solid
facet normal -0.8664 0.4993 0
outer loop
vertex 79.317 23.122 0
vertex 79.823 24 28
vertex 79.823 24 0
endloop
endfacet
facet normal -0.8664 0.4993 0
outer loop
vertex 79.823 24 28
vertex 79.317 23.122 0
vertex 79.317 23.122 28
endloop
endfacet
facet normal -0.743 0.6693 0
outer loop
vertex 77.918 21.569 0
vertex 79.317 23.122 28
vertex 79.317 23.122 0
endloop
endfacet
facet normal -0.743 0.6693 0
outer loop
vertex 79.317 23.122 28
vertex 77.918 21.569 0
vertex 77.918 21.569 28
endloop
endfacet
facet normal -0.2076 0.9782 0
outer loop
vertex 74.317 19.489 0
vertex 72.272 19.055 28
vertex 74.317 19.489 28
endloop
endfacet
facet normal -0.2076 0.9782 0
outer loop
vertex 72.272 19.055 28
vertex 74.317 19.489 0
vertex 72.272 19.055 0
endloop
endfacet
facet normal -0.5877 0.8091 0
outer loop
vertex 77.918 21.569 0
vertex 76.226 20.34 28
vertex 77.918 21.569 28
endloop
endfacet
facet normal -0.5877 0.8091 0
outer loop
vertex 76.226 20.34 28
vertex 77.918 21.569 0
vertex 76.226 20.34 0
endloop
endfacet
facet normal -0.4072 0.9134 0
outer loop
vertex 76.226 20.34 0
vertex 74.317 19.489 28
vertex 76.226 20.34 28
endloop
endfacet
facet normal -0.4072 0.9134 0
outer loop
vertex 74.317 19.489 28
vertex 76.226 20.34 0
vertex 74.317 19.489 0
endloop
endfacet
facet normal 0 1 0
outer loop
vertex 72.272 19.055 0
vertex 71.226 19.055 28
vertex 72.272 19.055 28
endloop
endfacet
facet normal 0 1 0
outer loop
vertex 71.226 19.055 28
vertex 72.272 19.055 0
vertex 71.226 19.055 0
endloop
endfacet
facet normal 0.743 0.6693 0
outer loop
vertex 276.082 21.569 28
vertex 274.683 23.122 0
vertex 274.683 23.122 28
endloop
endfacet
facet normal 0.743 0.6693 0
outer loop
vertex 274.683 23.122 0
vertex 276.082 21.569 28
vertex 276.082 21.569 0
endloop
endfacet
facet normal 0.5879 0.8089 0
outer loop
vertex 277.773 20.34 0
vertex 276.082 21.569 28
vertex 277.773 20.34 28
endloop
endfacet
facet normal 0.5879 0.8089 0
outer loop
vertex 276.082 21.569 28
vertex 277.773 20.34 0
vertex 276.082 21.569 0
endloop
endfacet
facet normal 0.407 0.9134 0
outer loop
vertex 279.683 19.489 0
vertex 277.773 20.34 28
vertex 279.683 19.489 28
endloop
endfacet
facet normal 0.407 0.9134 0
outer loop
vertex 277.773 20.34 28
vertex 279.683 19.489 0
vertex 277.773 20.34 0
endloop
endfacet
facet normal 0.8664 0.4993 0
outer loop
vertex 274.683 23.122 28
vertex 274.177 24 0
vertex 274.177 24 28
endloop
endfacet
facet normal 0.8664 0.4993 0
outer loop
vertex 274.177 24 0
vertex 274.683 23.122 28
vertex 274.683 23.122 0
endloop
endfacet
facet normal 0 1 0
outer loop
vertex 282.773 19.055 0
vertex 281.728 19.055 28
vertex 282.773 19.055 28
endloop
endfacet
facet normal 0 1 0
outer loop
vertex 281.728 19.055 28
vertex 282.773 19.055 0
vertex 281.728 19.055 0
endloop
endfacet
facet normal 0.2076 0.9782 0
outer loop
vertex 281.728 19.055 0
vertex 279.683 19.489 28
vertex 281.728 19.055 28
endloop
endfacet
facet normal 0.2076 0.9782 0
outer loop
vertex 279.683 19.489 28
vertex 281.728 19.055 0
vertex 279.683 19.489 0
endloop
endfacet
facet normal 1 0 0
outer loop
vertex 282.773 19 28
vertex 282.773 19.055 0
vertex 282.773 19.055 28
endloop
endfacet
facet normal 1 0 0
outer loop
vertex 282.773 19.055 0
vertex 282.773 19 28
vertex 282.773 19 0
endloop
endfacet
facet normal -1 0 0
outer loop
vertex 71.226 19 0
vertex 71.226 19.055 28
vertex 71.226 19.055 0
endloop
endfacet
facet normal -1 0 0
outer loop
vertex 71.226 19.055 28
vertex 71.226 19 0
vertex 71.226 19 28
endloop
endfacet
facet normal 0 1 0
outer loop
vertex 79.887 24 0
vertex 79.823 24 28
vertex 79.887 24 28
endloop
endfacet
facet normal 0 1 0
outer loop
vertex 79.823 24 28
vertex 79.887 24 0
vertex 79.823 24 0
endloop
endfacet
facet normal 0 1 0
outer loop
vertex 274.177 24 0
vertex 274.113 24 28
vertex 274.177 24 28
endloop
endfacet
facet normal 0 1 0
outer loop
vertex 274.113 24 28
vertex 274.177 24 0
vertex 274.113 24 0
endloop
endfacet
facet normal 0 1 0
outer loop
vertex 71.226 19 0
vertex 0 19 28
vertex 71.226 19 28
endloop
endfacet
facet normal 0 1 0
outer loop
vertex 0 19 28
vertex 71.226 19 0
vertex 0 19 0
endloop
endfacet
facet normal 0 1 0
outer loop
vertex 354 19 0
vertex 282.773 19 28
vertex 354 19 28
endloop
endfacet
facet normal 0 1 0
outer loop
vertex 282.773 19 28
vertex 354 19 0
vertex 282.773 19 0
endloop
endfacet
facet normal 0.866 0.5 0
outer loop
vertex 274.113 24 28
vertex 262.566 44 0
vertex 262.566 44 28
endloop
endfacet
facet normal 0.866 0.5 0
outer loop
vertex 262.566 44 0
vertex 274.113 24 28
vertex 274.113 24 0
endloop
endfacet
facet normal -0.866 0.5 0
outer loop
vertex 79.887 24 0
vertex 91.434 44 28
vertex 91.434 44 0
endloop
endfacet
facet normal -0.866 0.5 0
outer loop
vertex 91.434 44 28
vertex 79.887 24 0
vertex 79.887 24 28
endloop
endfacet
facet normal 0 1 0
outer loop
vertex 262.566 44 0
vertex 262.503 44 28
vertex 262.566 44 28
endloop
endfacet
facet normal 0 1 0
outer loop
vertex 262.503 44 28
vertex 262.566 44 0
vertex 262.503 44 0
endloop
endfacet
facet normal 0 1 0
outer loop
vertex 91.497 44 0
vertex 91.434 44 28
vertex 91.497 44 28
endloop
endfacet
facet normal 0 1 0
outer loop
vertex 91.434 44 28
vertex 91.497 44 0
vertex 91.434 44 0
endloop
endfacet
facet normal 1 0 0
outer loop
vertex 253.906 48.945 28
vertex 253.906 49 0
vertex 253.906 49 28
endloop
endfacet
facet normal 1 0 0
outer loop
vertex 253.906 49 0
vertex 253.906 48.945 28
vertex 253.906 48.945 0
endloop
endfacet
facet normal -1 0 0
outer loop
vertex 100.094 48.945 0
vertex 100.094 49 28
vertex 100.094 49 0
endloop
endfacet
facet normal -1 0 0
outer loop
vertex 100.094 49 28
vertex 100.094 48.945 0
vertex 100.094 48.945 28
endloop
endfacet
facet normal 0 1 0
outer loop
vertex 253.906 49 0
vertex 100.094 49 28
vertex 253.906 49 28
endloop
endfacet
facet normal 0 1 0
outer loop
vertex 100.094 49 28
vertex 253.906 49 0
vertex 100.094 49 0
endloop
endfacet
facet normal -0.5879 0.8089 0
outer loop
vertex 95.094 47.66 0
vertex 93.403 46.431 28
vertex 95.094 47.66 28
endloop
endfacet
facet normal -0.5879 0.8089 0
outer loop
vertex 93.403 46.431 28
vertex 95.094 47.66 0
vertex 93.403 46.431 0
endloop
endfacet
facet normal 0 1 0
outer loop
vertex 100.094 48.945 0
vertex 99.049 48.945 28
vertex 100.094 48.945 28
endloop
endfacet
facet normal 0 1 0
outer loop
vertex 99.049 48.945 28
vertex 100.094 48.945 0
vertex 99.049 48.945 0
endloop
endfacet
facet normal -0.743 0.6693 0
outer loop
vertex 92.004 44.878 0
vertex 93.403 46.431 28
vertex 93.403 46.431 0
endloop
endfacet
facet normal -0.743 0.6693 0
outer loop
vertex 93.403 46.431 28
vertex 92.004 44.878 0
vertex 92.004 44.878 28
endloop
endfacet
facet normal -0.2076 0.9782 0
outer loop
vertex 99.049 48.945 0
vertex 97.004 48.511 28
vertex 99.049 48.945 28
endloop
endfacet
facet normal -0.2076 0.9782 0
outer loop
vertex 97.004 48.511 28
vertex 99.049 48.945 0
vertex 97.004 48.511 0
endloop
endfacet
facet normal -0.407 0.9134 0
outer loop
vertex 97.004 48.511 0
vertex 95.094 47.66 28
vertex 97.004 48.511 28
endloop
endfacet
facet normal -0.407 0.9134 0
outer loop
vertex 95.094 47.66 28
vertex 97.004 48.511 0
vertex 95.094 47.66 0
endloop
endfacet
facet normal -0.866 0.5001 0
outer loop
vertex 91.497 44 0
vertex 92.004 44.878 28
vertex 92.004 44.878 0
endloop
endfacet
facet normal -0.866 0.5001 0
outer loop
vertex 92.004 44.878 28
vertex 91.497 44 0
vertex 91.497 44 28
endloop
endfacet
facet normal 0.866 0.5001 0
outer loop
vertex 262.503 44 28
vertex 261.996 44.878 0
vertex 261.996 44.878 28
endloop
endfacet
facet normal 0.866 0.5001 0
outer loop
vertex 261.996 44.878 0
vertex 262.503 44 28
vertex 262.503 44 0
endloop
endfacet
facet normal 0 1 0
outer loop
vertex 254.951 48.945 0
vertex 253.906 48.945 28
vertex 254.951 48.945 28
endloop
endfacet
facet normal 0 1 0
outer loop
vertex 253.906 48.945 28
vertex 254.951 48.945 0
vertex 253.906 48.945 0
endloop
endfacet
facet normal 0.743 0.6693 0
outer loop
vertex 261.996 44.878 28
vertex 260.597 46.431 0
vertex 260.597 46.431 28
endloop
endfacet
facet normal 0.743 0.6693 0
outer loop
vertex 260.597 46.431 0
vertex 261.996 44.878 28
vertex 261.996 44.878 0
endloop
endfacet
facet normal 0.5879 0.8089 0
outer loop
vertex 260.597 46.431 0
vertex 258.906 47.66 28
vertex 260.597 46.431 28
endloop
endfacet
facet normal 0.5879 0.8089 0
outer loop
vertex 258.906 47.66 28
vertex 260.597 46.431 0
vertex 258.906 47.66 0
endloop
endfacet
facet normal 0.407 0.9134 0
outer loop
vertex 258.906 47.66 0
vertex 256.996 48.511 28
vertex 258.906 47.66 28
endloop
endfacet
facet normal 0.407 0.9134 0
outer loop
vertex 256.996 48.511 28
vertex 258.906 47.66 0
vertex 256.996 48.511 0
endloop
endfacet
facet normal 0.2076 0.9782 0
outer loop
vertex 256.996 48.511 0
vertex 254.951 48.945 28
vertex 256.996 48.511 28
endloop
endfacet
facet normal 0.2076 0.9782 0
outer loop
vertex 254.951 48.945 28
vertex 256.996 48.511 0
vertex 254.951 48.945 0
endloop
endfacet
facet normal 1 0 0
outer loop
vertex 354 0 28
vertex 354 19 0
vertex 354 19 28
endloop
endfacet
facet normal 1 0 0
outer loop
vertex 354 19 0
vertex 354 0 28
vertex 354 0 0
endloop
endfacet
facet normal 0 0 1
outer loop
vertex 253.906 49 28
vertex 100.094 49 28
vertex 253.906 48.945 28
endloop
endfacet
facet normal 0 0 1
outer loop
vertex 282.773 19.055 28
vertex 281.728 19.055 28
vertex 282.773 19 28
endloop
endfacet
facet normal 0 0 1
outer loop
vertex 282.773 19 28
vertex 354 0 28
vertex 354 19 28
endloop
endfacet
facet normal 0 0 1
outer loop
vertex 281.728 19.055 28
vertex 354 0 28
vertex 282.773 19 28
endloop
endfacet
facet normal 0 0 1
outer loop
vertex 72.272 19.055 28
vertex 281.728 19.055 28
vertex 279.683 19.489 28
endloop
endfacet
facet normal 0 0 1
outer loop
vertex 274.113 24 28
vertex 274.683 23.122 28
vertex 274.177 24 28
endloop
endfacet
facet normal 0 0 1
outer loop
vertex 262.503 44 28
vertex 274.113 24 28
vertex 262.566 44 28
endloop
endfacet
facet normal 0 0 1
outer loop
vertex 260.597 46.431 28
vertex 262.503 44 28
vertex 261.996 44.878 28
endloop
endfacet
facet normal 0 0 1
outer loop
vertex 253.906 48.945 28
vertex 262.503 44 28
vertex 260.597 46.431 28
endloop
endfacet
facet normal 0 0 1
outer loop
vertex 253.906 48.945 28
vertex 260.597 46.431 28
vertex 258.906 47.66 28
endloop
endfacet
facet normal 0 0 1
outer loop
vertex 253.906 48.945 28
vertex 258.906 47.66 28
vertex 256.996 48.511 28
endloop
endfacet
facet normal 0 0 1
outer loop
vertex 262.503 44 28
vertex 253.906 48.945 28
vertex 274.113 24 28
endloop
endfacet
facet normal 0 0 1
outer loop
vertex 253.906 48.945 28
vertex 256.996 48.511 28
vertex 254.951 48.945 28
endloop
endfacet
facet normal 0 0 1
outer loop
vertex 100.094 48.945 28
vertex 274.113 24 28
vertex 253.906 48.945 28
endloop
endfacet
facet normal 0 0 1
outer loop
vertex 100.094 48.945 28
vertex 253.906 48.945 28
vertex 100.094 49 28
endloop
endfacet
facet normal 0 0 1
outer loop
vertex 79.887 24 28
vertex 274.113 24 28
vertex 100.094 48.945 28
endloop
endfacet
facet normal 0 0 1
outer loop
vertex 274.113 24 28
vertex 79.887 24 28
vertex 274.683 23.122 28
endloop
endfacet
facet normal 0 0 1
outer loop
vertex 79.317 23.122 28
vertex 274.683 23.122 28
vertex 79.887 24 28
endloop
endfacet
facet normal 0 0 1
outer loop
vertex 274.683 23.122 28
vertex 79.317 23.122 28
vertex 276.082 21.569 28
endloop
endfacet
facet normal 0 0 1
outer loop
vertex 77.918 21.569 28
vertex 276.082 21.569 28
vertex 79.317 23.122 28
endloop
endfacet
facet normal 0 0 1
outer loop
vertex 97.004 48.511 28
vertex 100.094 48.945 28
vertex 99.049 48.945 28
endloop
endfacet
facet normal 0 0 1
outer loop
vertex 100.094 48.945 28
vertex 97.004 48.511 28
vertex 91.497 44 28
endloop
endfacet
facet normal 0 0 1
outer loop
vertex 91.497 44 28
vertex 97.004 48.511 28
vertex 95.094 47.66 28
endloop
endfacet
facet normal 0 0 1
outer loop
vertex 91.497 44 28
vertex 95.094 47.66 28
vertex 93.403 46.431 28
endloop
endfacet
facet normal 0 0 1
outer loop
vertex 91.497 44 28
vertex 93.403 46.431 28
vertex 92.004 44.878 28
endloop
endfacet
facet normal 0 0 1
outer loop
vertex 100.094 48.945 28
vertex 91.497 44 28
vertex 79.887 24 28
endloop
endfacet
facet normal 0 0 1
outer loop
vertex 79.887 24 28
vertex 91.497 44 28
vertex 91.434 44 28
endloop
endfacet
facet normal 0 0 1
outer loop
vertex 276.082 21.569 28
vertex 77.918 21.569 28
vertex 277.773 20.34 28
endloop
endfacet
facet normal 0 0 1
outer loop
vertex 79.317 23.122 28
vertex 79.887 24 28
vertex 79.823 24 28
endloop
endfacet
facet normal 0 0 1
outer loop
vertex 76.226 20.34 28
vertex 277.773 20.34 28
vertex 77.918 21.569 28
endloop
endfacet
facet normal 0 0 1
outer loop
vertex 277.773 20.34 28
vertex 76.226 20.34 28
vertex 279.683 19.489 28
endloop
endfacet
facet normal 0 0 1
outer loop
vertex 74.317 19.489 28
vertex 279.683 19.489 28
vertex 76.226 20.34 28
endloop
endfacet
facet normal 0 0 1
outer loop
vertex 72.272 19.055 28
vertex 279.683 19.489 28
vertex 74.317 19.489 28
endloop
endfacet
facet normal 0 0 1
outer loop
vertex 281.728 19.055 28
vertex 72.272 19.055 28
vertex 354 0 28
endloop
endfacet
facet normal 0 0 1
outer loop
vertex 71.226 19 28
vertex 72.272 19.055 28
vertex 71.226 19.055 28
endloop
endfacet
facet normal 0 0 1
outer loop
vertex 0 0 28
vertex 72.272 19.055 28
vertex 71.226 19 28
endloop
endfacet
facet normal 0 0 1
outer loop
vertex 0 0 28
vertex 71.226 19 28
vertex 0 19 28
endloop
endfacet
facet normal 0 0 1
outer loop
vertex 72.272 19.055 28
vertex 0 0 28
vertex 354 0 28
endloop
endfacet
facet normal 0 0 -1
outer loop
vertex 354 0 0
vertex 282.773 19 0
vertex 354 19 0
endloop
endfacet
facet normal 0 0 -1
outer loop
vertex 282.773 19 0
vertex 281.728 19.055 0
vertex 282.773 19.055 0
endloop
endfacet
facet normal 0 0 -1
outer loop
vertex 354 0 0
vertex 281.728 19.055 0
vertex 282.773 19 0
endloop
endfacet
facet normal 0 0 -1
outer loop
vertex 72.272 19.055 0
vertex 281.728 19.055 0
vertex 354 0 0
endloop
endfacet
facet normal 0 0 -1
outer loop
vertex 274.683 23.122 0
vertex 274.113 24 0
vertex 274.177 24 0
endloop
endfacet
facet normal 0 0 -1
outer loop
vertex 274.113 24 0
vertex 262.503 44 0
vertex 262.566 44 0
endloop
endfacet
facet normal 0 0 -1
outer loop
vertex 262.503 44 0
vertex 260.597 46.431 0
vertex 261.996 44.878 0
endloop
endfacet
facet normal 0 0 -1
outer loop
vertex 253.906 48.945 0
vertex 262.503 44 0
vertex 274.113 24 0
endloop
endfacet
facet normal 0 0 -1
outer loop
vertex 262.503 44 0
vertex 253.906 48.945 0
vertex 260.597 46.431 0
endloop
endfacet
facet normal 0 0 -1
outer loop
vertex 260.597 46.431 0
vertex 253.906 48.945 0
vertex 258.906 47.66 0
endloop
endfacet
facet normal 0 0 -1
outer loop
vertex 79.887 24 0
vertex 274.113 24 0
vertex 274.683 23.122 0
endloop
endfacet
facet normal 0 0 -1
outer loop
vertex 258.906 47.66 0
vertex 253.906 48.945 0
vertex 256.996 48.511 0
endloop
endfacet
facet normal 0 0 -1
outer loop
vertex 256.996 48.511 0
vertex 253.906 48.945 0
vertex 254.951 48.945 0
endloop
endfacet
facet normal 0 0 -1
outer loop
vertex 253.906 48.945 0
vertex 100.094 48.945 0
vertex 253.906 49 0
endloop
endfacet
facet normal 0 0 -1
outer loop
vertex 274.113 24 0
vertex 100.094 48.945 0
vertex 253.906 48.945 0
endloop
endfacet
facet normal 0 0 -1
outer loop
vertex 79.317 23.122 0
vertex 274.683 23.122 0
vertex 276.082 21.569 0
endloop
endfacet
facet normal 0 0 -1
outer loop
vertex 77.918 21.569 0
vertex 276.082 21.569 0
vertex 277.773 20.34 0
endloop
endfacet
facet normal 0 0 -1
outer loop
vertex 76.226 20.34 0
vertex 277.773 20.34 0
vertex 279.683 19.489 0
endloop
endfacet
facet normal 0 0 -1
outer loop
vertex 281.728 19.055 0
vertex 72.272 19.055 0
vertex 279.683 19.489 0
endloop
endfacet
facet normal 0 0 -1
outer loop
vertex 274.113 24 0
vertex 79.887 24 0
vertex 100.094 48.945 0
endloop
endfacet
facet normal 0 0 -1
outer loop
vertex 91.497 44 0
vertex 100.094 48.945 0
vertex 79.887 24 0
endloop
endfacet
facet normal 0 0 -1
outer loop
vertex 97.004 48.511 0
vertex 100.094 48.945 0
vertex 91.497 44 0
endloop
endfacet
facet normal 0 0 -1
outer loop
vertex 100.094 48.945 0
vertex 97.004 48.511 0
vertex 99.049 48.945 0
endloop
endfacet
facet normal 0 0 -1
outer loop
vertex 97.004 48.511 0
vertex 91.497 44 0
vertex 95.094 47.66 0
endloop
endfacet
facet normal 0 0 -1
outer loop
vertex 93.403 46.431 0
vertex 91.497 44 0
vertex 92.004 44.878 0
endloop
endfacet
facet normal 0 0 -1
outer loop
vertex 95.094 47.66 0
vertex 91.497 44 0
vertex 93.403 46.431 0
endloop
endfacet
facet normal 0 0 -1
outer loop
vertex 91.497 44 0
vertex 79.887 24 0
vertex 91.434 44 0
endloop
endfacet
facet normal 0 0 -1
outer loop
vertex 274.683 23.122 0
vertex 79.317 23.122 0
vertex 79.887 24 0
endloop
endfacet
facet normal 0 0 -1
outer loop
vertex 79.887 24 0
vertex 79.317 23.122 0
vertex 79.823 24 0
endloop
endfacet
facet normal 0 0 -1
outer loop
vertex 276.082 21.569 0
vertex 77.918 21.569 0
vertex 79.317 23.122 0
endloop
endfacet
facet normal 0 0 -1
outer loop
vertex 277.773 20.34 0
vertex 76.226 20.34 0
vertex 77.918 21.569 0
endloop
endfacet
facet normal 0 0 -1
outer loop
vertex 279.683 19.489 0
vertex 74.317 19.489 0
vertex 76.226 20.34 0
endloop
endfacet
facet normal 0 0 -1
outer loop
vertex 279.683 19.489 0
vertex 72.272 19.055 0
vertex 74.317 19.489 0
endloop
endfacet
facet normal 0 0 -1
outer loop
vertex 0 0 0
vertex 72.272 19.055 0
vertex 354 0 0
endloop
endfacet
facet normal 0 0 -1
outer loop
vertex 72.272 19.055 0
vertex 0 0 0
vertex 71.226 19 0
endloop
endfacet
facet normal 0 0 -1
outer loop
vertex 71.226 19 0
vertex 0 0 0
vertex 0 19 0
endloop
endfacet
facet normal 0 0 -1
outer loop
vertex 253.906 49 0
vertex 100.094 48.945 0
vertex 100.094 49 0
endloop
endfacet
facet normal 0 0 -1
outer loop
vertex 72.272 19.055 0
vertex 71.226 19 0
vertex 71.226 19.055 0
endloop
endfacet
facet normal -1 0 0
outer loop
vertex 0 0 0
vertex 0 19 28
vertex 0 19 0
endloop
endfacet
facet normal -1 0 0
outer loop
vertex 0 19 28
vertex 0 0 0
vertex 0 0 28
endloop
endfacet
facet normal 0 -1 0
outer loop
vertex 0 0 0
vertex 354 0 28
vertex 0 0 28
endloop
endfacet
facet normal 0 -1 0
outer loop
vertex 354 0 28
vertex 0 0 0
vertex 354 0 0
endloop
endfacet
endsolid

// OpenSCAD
include <../src/wardrobe.scad>;
plank_yz_middle_top();
//github_openscad -o wardrobe_3/plank_yz_middle_top.stl -D wardrobe_n=3 -D cutting_edge=0 -D break_view_length=0 wardrobe_3/plank_yz_middle_top_stl.scad
